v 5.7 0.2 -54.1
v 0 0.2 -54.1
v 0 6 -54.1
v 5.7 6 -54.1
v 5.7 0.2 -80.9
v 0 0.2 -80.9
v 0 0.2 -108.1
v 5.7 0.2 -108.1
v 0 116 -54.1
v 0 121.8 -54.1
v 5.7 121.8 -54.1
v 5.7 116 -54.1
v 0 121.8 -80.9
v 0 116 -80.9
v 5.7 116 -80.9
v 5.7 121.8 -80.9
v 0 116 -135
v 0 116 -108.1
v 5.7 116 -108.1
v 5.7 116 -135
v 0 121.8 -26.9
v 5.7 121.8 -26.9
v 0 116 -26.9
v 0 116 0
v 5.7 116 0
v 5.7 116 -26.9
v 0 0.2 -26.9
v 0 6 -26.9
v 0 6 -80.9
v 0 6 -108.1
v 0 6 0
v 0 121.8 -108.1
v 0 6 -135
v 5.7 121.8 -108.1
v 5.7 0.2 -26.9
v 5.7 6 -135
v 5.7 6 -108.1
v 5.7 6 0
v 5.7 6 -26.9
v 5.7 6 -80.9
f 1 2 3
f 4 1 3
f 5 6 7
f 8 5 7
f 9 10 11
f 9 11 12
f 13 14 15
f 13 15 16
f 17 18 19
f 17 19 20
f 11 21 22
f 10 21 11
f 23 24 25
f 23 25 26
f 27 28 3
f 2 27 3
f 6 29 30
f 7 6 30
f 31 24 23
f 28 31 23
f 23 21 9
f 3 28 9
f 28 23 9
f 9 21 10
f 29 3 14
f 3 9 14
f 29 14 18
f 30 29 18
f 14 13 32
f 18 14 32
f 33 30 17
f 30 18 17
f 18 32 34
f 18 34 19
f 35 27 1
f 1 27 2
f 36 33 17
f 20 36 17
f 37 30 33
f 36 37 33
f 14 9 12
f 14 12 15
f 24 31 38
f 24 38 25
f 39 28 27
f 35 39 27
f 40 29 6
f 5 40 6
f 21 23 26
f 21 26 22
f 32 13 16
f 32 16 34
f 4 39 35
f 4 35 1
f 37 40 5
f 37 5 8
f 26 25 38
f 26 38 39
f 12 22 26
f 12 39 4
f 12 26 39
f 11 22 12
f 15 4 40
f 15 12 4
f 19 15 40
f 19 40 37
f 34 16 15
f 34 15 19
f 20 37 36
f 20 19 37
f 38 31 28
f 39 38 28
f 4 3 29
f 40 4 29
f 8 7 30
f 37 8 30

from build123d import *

# Parameters (mm, degrees)
SKETCH1_W           = 135
SKETCH1_H           = 122
BOSS_EXTRUDE1_DEPTH = 5.7
CUT_EXTRUDE1_DEPTH  = 57


with BuildPart() as part:
    # Sketch1 → Boss-Extrude1 (new body)
    with BuildSketch(Plane(origin=(0, 0, 0), x_dir=(0, 0, -1), z_dir=(1, 0, 0))):
        with Locations((67.5, 61)):
            Rectangle(SKETCH1_W, SKETCH1_H)
    extrude(amount=BOSS_EXTRUDE1_DEPTH)

    # Sketch2 → Cut-Extrude1 (cut)
    with BuildSketch(Plane(origin=(0, 0, 0), x_dir=(0, 0, -1), z_dir=(1, 0, 0))):
        Polygon((0, 116), (26.9, 116), (26.9, 121.8), (54.1, 121.8), (54.1, 116), (80.9, 116), (80.9, 121.8), (108.1, 121.8), (108.1, 116), (135, 116), (135, 130), (0, 130), align=None)
        Polygon((0, -8), (0, 6), (26.9, 6), (26.9, 0.2), (54.1, 0.2), (54.1, 6), (80.9, 6), (80.9, 0.2), (108.1, 0.2), (108.1, 6), (135, 6), (135, -8), align=None)
    extrude(amount=CUT_EXTRUDE1_DEPTH, mode=Mode.SUBTRACT)


solid = part.part
